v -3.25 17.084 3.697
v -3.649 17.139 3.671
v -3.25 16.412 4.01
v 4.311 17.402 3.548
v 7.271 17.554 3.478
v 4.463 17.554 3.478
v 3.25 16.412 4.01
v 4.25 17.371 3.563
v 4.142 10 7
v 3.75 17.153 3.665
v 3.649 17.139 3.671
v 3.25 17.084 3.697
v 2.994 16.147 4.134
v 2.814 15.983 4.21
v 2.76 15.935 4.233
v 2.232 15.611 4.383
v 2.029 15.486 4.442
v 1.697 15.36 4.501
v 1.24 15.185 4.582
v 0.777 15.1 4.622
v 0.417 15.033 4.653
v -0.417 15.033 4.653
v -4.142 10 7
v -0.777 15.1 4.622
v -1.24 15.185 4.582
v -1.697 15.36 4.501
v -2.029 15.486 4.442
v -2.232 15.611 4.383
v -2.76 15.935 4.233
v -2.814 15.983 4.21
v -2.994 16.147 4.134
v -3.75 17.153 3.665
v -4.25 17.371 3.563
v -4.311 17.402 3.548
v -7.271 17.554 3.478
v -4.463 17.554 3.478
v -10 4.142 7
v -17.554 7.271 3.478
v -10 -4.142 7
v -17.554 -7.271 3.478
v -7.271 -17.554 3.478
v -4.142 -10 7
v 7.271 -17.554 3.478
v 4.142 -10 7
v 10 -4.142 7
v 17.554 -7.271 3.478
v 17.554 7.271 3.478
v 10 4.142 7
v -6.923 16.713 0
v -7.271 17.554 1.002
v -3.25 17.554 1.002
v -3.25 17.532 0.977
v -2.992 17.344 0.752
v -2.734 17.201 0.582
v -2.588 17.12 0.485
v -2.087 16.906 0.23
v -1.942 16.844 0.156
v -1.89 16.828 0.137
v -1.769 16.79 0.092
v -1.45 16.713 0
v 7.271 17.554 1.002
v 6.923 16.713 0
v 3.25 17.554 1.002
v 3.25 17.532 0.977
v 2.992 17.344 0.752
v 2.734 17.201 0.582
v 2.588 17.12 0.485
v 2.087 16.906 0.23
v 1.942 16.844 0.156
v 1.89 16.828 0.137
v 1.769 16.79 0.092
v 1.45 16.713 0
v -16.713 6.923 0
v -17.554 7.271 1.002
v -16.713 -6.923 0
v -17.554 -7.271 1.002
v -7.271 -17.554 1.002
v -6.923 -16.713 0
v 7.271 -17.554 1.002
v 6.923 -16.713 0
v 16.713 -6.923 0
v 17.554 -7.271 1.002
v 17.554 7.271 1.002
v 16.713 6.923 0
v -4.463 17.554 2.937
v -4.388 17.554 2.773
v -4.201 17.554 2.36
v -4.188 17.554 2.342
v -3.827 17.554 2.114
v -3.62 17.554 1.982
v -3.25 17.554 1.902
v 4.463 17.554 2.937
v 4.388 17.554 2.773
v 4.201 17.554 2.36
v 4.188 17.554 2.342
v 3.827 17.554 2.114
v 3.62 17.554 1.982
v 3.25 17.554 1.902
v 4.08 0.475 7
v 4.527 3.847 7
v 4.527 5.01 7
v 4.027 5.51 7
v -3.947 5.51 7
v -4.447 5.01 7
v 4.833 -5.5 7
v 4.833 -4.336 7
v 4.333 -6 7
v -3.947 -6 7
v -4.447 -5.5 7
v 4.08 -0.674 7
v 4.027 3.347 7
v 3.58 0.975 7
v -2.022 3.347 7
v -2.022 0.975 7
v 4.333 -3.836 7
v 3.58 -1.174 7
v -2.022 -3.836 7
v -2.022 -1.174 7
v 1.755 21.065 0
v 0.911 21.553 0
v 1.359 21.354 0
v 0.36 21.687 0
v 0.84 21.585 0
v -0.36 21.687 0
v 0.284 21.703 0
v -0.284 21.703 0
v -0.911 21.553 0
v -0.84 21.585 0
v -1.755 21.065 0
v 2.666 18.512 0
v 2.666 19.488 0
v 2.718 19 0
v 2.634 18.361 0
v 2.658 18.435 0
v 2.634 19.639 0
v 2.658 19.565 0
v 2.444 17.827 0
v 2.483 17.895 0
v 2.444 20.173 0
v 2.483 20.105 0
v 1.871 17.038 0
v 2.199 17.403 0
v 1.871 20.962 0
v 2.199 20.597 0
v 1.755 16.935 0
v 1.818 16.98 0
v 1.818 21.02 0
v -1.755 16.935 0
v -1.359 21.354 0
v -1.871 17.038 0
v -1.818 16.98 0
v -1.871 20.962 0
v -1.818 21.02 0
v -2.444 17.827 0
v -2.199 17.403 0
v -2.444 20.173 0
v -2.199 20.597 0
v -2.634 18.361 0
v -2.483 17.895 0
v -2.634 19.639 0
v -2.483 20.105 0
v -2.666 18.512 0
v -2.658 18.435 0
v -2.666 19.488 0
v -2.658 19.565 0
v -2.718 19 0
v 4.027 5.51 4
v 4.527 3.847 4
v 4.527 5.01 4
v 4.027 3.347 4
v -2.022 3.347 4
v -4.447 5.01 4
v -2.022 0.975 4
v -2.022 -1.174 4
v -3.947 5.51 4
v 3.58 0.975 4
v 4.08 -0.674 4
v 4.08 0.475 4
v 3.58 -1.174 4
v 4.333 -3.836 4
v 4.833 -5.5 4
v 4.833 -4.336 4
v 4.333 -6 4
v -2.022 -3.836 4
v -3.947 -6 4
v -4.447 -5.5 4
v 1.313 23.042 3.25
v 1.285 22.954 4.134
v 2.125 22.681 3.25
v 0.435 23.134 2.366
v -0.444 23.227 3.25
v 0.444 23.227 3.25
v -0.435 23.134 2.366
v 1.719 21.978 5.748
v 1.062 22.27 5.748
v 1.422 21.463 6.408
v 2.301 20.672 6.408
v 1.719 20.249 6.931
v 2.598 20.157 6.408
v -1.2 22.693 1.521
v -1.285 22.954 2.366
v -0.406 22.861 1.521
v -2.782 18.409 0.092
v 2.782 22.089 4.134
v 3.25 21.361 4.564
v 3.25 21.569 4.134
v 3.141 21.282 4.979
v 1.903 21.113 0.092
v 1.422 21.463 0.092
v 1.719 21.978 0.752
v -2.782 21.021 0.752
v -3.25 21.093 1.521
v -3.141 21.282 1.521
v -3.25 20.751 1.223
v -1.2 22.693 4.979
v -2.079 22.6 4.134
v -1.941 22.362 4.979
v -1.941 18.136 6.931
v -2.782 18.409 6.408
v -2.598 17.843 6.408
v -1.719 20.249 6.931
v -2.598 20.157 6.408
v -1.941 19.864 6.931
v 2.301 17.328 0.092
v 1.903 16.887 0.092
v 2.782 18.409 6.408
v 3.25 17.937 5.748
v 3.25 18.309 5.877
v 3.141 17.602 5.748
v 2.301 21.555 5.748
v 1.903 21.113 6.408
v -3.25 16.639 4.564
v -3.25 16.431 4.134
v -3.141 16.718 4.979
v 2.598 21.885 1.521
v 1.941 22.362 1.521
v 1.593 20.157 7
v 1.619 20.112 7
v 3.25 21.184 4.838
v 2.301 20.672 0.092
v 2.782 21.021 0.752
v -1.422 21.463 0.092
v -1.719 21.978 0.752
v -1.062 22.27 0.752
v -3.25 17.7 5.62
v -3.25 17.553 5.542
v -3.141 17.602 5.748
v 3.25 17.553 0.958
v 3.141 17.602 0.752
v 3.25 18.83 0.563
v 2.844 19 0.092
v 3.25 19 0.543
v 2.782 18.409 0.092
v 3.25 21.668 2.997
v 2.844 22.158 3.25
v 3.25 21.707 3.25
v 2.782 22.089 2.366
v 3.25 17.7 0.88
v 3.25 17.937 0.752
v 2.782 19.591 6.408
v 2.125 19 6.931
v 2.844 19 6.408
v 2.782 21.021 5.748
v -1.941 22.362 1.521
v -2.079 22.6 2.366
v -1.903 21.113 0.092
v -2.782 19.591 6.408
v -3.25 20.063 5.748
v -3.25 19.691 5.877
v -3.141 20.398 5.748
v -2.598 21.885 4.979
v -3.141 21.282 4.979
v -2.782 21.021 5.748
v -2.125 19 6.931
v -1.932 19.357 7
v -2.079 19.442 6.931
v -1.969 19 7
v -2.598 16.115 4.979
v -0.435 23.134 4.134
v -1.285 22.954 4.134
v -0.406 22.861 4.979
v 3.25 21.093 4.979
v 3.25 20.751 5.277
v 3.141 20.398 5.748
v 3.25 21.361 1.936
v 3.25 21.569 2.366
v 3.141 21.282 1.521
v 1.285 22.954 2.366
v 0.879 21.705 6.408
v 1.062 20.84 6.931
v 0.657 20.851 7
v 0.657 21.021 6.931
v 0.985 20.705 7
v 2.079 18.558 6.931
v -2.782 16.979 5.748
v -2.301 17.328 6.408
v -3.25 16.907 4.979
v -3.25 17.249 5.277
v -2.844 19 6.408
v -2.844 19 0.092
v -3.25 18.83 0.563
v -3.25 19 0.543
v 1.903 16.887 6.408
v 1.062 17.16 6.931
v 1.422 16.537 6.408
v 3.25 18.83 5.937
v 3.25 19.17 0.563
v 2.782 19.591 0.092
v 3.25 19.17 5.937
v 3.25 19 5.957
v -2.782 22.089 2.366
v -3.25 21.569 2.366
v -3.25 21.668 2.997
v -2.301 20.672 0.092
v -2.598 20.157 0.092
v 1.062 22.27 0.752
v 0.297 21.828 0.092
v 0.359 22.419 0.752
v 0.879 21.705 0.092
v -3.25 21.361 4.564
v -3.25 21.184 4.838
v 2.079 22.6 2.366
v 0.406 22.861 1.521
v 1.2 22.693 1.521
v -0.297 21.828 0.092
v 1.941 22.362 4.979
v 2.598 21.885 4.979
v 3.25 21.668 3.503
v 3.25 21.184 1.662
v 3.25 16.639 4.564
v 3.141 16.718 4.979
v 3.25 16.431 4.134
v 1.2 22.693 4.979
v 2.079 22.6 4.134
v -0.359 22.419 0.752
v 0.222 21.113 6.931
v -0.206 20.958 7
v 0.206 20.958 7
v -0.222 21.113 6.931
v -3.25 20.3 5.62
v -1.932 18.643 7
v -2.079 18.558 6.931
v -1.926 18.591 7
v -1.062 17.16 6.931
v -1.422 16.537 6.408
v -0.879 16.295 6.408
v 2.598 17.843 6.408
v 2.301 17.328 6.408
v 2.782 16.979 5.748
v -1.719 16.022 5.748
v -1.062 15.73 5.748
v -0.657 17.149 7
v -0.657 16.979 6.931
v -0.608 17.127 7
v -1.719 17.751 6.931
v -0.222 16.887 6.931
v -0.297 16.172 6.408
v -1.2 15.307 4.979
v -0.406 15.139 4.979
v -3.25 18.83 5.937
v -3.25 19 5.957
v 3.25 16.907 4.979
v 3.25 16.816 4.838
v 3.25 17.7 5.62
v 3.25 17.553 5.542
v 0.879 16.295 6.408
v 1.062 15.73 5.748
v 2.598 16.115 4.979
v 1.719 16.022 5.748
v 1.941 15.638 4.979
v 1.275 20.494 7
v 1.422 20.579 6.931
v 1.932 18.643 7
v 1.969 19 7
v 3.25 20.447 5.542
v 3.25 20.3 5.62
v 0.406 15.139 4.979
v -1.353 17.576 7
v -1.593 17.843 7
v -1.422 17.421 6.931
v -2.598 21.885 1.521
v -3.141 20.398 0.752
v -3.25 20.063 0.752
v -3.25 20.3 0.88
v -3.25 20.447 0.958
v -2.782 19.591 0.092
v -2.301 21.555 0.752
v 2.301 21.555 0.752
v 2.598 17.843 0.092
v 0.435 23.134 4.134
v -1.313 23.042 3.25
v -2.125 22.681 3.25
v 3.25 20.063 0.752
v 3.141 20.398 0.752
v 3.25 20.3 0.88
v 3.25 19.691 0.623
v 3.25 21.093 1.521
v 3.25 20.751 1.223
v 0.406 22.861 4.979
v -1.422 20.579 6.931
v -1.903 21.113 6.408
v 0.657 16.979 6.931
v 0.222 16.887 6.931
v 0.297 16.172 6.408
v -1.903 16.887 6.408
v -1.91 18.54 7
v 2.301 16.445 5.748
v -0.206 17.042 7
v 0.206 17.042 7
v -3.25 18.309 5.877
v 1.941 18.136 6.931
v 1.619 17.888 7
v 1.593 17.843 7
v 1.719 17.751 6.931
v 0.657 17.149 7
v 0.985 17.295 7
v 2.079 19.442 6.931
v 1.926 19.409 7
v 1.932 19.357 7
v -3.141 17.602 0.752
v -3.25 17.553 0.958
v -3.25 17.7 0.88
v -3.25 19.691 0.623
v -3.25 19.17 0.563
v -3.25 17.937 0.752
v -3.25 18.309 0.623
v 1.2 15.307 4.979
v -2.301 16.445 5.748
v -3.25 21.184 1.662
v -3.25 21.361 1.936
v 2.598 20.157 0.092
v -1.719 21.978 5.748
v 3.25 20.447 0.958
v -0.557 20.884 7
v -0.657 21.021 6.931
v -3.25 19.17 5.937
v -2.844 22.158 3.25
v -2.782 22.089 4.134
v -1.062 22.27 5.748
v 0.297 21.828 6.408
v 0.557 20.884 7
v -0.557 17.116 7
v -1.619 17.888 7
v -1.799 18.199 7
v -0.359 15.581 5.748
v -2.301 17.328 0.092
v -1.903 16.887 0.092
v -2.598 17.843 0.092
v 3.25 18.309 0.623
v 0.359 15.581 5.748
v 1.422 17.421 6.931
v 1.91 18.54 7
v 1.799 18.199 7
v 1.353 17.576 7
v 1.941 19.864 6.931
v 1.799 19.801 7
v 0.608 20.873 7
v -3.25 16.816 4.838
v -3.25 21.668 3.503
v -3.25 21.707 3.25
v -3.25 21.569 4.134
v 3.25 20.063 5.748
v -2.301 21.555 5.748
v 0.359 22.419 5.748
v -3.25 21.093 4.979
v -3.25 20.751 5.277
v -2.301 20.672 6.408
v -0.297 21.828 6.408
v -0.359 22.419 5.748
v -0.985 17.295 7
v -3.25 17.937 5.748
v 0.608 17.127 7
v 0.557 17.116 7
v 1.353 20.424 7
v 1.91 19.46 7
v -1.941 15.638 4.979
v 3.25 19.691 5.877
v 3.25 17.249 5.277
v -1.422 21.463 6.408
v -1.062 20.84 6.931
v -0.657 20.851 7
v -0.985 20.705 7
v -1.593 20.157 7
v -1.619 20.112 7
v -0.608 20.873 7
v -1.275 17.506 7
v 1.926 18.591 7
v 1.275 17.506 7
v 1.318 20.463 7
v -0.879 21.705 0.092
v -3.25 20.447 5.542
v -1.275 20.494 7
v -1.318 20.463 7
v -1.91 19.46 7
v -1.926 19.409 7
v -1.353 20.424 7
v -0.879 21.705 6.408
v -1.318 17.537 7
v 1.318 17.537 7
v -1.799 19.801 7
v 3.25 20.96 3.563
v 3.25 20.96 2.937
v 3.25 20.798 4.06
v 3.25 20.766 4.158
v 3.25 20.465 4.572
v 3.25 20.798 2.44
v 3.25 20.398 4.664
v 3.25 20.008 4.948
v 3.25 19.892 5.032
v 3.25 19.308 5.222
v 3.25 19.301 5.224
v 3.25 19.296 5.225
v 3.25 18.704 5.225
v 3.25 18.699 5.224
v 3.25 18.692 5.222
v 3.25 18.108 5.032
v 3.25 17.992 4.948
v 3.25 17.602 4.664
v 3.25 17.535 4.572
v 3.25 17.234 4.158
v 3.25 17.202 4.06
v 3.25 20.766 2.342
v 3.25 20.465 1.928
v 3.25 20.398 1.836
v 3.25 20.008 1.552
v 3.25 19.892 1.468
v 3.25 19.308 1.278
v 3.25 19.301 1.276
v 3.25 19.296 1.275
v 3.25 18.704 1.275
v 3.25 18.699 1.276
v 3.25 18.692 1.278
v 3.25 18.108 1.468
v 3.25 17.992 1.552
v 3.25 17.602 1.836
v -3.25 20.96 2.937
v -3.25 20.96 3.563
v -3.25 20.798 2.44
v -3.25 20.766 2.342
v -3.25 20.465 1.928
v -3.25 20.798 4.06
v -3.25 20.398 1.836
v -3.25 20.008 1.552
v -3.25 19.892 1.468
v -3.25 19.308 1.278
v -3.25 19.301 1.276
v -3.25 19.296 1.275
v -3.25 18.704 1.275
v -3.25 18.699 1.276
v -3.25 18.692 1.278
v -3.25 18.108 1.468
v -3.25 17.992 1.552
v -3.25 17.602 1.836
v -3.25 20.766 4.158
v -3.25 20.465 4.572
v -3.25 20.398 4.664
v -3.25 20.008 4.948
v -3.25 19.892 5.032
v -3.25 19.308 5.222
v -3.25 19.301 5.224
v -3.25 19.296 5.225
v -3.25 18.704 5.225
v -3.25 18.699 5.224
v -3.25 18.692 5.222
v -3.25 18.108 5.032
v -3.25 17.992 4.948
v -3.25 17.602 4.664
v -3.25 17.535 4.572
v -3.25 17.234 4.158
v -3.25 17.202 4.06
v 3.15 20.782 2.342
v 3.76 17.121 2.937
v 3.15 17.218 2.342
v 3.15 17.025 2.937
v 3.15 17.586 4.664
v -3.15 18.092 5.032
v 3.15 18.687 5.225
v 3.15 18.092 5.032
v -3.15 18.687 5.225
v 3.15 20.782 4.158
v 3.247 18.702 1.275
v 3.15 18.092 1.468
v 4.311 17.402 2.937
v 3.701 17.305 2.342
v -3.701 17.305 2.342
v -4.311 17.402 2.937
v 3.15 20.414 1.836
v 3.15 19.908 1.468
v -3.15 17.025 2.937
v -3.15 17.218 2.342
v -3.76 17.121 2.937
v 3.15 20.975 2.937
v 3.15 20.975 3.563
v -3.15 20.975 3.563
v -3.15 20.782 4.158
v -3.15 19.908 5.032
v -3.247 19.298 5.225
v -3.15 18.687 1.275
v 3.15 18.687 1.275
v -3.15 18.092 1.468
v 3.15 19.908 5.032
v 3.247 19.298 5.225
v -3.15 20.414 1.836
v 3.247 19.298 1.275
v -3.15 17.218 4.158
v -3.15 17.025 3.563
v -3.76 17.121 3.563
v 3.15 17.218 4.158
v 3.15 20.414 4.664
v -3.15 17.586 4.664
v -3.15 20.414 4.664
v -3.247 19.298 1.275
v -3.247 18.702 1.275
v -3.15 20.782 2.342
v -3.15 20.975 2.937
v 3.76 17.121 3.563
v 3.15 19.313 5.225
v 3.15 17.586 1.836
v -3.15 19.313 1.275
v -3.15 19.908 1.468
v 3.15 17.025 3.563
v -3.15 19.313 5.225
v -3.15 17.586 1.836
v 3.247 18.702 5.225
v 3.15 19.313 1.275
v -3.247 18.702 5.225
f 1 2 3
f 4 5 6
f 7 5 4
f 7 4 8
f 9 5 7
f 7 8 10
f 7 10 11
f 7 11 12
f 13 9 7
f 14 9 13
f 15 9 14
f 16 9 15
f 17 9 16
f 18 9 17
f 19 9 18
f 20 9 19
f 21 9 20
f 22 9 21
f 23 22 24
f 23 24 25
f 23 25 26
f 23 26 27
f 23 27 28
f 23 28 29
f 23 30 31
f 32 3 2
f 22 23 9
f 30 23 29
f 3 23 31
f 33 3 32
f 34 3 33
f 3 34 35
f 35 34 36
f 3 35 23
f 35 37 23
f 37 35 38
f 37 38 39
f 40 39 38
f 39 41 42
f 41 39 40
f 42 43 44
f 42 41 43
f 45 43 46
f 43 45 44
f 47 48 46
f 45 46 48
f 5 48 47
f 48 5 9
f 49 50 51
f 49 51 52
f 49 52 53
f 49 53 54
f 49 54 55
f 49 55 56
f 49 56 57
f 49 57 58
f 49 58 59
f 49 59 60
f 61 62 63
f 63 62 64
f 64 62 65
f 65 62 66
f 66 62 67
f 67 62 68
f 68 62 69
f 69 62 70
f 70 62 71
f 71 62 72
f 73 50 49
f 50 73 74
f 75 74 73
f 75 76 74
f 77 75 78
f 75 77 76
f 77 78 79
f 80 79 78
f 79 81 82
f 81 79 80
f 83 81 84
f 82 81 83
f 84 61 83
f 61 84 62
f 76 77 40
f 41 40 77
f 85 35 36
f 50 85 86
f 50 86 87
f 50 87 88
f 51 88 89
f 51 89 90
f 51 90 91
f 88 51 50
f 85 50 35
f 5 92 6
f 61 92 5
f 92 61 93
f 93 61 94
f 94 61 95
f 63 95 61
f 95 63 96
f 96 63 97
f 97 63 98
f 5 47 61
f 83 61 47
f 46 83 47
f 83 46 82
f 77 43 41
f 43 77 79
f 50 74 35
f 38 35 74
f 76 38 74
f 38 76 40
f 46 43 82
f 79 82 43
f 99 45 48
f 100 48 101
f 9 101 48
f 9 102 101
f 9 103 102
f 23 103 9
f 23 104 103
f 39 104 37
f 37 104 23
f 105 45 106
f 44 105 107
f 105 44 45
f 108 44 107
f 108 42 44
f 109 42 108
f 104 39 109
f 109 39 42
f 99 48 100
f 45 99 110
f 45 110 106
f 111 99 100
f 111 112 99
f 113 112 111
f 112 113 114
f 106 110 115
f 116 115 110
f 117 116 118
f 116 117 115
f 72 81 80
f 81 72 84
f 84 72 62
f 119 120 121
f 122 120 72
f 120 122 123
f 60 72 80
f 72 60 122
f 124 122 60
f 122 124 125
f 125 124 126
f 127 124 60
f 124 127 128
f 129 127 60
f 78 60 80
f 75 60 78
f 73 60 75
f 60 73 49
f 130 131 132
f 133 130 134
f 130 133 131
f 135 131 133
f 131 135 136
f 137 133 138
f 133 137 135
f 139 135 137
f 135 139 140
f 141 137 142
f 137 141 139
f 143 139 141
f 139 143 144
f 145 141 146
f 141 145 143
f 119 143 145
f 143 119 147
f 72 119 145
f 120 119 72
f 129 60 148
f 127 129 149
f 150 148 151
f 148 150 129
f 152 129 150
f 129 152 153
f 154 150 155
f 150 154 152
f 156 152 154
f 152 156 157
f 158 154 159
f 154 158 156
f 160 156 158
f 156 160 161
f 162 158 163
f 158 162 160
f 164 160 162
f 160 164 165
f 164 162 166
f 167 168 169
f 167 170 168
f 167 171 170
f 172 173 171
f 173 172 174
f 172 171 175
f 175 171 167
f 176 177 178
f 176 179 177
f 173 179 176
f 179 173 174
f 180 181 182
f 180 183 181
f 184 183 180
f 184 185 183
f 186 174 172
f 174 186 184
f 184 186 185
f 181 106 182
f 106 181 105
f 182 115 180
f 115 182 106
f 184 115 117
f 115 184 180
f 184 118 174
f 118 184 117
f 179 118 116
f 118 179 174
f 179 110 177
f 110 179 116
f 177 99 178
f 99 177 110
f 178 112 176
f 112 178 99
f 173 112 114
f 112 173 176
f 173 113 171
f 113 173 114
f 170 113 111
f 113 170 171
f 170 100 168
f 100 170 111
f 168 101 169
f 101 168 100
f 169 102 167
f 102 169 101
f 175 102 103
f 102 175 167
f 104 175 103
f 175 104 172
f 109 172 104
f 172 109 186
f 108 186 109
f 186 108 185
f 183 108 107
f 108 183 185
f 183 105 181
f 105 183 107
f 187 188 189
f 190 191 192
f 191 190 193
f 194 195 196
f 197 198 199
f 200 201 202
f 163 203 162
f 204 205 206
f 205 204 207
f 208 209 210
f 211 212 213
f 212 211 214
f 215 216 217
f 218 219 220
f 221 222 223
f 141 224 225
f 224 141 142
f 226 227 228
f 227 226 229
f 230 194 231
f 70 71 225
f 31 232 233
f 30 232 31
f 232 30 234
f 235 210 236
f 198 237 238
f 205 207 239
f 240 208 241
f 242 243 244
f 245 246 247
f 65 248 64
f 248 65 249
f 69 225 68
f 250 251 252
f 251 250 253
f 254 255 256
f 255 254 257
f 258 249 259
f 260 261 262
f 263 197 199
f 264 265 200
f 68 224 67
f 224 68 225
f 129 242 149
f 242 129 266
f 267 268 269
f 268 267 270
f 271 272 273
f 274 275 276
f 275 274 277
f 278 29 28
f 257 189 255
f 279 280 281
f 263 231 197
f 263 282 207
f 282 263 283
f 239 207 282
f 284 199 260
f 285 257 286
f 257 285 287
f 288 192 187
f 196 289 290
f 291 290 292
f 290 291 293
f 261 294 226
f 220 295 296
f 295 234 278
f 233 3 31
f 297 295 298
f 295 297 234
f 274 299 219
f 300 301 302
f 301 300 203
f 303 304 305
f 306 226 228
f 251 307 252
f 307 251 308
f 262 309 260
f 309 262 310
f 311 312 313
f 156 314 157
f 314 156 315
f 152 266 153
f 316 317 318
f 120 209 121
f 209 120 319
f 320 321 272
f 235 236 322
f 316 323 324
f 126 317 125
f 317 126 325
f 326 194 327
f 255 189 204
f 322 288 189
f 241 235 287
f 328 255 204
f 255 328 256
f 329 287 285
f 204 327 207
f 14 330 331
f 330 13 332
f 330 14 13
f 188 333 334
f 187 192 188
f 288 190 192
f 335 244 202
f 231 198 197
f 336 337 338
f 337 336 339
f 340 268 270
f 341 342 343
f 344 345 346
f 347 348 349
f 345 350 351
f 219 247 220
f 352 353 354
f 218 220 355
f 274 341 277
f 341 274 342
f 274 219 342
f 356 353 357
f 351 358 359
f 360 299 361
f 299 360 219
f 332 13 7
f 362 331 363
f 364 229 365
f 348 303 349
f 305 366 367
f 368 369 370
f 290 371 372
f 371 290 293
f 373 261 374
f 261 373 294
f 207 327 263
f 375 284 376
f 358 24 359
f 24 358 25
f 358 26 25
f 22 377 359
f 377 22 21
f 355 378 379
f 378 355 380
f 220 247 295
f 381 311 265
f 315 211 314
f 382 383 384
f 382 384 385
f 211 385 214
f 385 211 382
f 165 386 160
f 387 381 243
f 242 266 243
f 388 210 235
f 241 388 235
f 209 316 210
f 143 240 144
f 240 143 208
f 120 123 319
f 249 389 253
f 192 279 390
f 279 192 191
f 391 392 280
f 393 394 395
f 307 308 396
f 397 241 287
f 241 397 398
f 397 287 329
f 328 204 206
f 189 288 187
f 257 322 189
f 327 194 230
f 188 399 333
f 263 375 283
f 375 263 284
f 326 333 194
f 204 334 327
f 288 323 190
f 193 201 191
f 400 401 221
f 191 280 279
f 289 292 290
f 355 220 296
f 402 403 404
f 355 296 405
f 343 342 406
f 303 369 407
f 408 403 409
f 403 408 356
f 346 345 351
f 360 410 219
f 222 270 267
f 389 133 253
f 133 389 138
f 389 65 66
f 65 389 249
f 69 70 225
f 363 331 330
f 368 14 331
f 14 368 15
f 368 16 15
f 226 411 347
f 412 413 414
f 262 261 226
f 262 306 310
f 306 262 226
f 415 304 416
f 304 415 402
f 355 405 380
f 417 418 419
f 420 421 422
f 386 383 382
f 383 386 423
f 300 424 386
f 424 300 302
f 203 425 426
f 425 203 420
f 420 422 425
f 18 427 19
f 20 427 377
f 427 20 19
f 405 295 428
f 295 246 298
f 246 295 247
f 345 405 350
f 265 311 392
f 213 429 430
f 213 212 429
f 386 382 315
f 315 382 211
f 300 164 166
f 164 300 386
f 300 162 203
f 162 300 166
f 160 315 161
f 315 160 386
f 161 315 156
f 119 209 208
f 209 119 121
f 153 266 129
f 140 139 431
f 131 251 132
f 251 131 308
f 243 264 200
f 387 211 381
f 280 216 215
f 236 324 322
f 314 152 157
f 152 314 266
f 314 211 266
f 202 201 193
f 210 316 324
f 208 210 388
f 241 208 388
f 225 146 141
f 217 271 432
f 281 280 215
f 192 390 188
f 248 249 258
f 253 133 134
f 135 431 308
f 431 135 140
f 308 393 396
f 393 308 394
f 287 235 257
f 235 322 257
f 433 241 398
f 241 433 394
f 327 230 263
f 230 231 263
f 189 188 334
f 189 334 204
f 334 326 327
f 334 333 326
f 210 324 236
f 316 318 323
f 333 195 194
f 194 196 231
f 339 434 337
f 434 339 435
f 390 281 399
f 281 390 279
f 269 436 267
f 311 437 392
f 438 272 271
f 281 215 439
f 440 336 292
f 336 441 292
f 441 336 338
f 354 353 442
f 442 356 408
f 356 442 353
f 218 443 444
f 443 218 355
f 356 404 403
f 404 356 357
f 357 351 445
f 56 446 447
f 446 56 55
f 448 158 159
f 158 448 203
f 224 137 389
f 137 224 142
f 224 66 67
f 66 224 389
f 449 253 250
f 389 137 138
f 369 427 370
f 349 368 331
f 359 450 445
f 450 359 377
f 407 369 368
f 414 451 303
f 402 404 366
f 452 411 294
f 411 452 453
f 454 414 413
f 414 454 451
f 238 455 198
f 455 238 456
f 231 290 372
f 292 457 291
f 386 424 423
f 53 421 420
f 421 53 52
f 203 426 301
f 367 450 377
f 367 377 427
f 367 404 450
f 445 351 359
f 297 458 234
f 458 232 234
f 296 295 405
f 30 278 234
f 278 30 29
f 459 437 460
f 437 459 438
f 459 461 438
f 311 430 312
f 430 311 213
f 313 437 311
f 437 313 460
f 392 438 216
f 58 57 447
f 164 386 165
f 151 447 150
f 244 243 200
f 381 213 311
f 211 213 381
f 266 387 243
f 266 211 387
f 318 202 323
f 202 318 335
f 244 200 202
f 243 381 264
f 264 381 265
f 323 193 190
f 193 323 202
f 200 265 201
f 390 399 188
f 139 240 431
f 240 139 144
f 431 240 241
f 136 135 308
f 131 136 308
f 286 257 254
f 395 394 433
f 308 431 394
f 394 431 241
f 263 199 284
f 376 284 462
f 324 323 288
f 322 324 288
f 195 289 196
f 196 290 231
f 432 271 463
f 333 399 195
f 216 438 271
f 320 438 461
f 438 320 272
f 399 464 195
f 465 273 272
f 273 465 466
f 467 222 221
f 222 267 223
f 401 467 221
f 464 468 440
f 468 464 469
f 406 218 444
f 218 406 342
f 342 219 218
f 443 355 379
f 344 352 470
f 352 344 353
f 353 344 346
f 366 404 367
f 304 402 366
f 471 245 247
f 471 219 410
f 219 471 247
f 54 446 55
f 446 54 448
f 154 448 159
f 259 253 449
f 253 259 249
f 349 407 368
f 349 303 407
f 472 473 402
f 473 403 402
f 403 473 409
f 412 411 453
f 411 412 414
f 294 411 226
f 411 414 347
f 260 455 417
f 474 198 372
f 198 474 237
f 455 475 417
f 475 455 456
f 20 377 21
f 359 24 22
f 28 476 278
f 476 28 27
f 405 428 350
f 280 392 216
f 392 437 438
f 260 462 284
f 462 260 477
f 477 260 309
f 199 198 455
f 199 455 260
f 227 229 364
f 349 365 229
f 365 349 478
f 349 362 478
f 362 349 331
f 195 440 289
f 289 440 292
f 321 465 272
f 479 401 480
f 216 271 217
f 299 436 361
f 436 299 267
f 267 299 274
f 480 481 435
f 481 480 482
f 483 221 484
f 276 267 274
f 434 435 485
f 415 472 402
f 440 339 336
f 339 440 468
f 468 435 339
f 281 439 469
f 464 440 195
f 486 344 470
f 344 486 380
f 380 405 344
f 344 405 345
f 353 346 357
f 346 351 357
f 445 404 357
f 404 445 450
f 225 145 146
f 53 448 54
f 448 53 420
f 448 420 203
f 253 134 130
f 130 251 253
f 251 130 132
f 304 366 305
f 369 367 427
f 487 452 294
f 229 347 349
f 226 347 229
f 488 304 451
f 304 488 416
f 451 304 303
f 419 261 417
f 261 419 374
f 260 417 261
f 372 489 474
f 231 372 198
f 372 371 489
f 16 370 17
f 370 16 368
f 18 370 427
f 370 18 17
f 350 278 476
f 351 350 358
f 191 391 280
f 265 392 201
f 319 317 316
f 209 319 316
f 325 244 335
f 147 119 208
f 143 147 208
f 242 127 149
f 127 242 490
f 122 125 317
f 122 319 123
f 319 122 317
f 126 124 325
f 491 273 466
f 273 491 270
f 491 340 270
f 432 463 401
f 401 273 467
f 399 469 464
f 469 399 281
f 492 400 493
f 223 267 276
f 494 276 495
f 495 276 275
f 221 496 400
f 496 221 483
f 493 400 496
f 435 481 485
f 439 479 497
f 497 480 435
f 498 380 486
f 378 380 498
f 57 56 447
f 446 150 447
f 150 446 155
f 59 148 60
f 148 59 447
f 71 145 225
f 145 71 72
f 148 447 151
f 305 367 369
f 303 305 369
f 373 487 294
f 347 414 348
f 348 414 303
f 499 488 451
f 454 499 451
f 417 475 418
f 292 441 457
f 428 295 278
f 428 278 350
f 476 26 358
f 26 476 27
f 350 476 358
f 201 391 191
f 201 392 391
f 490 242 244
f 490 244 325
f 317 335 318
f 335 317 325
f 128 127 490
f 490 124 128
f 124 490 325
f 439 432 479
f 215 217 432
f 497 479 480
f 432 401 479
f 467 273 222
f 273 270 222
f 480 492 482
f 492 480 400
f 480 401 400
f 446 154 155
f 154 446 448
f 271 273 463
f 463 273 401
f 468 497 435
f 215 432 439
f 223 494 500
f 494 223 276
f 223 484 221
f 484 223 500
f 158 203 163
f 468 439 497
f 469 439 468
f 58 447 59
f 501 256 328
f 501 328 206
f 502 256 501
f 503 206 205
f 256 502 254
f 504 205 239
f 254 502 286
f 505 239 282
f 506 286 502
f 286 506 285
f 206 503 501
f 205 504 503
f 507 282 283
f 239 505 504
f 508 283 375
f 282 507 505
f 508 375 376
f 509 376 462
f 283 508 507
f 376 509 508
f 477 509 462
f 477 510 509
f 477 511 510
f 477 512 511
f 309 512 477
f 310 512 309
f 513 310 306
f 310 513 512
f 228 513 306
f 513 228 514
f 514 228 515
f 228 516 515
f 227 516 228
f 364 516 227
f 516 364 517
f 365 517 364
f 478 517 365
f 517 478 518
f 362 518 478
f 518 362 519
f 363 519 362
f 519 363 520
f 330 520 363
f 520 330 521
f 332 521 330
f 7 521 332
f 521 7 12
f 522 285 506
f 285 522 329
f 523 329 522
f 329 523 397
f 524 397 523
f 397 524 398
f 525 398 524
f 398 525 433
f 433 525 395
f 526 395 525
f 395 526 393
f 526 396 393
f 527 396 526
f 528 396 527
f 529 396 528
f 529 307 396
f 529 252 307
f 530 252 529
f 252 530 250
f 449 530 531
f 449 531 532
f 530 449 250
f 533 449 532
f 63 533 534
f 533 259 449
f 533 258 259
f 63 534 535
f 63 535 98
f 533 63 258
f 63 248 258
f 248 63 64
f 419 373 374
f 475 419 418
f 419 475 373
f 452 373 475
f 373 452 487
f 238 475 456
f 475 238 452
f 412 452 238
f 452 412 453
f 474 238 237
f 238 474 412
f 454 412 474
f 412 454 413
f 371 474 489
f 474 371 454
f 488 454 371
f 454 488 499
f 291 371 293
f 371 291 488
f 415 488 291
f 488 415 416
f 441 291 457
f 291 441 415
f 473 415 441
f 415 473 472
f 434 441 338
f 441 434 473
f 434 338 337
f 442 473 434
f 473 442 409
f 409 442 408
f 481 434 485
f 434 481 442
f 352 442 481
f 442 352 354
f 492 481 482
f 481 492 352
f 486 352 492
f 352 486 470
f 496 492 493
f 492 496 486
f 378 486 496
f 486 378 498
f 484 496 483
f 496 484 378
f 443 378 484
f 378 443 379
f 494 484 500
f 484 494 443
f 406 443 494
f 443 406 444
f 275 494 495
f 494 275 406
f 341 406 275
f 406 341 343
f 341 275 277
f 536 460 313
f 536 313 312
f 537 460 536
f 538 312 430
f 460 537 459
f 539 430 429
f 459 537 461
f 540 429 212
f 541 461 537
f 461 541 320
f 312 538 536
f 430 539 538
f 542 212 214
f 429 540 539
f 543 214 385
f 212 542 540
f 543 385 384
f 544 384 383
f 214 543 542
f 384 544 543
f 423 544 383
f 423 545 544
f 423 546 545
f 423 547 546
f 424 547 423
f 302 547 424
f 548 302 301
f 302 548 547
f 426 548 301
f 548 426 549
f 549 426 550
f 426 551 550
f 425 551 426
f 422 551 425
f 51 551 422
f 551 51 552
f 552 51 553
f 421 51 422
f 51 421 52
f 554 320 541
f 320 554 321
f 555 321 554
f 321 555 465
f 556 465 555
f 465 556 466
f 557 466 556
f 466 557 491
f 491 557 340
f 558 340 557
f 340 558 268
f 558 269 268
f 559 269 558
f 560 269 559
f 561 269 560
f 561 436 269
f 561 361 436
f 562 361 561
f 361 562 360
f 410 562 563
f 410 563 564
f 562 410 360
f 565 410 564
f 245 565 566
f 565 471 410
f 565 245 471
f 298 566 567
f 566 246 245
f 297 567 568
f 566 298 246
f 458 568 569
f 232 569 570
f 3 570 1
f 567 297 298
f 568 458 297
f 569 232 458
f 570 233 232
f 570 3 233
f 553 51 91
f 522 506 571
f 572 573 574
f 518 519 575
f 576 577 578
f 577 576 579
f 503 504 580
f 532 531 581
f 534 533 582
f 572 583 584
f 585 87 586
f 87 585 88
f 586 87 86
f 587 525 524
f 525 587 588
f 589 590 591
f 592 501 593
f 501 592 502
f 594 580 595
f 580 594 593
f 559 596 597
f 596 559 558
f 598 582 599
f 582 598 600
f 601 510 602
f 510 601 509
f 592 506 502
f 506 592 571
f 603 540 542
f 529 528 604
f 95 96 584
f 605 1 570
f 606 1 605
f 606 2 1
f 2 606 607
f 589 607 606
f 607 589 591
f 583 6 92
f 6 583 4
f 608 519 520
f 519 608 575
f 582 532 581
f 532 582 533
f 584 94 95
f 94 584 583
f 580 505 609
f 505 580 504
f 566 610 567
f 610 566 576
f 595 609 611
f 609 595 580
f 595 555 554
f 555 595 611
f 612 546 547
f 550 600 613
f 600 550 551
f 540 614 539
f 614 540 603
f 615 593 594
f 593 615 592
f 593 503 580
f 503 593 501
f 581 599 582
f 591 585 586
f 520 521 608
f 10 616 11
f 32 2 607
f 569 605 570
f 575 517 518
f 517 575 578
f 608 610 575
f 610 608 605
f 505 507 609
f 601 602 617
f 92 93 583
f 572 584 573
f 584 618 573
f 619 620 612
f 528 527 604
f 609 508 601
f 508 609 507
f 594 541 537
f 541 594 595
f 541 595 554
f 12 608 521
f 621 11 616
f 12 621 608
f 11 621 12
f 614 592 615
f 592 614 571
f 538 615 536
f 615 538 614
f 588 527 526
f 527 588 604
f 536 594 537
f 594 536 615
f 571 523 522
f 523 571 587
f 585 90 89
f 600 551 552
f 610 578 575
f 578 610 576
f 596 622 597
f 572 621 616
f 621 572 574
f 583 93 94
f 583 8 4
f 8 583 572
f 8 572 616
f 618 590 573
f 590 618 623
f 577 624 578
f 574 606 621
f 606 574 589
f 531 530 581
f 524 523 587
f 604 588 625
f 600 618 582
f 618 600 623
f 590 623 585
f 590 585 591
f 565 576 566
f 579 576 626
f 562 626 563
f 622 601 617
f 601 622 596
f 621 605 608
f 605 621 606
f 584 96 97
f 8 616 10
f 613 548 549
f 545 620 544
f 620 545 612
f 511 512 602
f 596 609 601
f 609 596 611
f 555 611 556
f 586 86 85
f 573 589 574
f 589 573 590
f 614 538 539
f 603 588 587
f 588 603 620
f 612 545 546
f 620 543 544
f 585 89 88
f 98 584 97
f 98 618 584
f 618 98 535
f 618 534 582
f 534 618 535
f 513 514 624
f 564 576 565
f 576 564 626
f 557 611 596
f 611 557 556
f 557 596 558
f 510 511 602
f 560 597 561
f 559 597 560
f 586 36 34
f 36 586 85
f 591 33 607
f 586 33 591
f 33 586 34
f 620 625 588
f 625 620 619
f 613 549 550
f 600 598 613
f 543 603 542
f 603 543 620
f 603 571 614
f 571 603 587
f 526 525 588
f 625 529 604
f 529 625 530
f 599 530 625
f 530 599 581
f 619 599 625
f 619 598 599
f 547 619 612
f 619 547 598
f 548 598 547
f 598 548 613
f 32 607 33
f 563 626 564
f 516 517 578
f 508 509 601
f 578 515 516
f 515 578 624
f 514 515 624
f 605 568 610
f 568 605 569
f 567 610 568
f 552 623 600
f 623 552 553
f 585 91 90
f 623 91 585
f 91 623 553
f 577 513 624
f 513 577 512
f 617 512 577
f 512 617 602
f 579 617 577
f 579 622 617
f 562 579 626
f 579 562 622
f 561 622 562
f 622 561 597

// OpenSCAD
diam = 38;
height = 7;
crown_diam = 20;
sphere_d = 8.5;

module cuts(slope) {
  for (a = [0:7])
    rotate([0, 0, 360*a/8])
      translate([-diam/2, crown_diam/2, height])
        rotate([-slope, 0, 0])
          cube(diam);
}

difference() {
  union() {
    difference() {
      rotate([0, 0, 360/16])
        cylinder(h=height, d=diam, $fn=8);

      cuts(25);

      translate([0, 0, height-8])
        scale([1, 1, -1])
          cuts(50);
      
      translate([-5.2, -5.5, height-3])
        linear_extrude(20)
          offset(0.5)
            text("E", size=11);
    }

    translate([0, diam/2, sphere_d/2-1]) {
      intersection() {
        sphere(d=sphere_d, $fn=30);
        translate([0, 0, 0.25])
          cube([sphere_d-2, sphere_d, sphere_d-1.5], center=true);
      }
    }
  }

  hull()
    for (a = [-1, 1])
      translate([a*(sphere_d/2-1.1), diam/2, sphere_d/2-1])
        sphere(d=4, $fn=20);
}
